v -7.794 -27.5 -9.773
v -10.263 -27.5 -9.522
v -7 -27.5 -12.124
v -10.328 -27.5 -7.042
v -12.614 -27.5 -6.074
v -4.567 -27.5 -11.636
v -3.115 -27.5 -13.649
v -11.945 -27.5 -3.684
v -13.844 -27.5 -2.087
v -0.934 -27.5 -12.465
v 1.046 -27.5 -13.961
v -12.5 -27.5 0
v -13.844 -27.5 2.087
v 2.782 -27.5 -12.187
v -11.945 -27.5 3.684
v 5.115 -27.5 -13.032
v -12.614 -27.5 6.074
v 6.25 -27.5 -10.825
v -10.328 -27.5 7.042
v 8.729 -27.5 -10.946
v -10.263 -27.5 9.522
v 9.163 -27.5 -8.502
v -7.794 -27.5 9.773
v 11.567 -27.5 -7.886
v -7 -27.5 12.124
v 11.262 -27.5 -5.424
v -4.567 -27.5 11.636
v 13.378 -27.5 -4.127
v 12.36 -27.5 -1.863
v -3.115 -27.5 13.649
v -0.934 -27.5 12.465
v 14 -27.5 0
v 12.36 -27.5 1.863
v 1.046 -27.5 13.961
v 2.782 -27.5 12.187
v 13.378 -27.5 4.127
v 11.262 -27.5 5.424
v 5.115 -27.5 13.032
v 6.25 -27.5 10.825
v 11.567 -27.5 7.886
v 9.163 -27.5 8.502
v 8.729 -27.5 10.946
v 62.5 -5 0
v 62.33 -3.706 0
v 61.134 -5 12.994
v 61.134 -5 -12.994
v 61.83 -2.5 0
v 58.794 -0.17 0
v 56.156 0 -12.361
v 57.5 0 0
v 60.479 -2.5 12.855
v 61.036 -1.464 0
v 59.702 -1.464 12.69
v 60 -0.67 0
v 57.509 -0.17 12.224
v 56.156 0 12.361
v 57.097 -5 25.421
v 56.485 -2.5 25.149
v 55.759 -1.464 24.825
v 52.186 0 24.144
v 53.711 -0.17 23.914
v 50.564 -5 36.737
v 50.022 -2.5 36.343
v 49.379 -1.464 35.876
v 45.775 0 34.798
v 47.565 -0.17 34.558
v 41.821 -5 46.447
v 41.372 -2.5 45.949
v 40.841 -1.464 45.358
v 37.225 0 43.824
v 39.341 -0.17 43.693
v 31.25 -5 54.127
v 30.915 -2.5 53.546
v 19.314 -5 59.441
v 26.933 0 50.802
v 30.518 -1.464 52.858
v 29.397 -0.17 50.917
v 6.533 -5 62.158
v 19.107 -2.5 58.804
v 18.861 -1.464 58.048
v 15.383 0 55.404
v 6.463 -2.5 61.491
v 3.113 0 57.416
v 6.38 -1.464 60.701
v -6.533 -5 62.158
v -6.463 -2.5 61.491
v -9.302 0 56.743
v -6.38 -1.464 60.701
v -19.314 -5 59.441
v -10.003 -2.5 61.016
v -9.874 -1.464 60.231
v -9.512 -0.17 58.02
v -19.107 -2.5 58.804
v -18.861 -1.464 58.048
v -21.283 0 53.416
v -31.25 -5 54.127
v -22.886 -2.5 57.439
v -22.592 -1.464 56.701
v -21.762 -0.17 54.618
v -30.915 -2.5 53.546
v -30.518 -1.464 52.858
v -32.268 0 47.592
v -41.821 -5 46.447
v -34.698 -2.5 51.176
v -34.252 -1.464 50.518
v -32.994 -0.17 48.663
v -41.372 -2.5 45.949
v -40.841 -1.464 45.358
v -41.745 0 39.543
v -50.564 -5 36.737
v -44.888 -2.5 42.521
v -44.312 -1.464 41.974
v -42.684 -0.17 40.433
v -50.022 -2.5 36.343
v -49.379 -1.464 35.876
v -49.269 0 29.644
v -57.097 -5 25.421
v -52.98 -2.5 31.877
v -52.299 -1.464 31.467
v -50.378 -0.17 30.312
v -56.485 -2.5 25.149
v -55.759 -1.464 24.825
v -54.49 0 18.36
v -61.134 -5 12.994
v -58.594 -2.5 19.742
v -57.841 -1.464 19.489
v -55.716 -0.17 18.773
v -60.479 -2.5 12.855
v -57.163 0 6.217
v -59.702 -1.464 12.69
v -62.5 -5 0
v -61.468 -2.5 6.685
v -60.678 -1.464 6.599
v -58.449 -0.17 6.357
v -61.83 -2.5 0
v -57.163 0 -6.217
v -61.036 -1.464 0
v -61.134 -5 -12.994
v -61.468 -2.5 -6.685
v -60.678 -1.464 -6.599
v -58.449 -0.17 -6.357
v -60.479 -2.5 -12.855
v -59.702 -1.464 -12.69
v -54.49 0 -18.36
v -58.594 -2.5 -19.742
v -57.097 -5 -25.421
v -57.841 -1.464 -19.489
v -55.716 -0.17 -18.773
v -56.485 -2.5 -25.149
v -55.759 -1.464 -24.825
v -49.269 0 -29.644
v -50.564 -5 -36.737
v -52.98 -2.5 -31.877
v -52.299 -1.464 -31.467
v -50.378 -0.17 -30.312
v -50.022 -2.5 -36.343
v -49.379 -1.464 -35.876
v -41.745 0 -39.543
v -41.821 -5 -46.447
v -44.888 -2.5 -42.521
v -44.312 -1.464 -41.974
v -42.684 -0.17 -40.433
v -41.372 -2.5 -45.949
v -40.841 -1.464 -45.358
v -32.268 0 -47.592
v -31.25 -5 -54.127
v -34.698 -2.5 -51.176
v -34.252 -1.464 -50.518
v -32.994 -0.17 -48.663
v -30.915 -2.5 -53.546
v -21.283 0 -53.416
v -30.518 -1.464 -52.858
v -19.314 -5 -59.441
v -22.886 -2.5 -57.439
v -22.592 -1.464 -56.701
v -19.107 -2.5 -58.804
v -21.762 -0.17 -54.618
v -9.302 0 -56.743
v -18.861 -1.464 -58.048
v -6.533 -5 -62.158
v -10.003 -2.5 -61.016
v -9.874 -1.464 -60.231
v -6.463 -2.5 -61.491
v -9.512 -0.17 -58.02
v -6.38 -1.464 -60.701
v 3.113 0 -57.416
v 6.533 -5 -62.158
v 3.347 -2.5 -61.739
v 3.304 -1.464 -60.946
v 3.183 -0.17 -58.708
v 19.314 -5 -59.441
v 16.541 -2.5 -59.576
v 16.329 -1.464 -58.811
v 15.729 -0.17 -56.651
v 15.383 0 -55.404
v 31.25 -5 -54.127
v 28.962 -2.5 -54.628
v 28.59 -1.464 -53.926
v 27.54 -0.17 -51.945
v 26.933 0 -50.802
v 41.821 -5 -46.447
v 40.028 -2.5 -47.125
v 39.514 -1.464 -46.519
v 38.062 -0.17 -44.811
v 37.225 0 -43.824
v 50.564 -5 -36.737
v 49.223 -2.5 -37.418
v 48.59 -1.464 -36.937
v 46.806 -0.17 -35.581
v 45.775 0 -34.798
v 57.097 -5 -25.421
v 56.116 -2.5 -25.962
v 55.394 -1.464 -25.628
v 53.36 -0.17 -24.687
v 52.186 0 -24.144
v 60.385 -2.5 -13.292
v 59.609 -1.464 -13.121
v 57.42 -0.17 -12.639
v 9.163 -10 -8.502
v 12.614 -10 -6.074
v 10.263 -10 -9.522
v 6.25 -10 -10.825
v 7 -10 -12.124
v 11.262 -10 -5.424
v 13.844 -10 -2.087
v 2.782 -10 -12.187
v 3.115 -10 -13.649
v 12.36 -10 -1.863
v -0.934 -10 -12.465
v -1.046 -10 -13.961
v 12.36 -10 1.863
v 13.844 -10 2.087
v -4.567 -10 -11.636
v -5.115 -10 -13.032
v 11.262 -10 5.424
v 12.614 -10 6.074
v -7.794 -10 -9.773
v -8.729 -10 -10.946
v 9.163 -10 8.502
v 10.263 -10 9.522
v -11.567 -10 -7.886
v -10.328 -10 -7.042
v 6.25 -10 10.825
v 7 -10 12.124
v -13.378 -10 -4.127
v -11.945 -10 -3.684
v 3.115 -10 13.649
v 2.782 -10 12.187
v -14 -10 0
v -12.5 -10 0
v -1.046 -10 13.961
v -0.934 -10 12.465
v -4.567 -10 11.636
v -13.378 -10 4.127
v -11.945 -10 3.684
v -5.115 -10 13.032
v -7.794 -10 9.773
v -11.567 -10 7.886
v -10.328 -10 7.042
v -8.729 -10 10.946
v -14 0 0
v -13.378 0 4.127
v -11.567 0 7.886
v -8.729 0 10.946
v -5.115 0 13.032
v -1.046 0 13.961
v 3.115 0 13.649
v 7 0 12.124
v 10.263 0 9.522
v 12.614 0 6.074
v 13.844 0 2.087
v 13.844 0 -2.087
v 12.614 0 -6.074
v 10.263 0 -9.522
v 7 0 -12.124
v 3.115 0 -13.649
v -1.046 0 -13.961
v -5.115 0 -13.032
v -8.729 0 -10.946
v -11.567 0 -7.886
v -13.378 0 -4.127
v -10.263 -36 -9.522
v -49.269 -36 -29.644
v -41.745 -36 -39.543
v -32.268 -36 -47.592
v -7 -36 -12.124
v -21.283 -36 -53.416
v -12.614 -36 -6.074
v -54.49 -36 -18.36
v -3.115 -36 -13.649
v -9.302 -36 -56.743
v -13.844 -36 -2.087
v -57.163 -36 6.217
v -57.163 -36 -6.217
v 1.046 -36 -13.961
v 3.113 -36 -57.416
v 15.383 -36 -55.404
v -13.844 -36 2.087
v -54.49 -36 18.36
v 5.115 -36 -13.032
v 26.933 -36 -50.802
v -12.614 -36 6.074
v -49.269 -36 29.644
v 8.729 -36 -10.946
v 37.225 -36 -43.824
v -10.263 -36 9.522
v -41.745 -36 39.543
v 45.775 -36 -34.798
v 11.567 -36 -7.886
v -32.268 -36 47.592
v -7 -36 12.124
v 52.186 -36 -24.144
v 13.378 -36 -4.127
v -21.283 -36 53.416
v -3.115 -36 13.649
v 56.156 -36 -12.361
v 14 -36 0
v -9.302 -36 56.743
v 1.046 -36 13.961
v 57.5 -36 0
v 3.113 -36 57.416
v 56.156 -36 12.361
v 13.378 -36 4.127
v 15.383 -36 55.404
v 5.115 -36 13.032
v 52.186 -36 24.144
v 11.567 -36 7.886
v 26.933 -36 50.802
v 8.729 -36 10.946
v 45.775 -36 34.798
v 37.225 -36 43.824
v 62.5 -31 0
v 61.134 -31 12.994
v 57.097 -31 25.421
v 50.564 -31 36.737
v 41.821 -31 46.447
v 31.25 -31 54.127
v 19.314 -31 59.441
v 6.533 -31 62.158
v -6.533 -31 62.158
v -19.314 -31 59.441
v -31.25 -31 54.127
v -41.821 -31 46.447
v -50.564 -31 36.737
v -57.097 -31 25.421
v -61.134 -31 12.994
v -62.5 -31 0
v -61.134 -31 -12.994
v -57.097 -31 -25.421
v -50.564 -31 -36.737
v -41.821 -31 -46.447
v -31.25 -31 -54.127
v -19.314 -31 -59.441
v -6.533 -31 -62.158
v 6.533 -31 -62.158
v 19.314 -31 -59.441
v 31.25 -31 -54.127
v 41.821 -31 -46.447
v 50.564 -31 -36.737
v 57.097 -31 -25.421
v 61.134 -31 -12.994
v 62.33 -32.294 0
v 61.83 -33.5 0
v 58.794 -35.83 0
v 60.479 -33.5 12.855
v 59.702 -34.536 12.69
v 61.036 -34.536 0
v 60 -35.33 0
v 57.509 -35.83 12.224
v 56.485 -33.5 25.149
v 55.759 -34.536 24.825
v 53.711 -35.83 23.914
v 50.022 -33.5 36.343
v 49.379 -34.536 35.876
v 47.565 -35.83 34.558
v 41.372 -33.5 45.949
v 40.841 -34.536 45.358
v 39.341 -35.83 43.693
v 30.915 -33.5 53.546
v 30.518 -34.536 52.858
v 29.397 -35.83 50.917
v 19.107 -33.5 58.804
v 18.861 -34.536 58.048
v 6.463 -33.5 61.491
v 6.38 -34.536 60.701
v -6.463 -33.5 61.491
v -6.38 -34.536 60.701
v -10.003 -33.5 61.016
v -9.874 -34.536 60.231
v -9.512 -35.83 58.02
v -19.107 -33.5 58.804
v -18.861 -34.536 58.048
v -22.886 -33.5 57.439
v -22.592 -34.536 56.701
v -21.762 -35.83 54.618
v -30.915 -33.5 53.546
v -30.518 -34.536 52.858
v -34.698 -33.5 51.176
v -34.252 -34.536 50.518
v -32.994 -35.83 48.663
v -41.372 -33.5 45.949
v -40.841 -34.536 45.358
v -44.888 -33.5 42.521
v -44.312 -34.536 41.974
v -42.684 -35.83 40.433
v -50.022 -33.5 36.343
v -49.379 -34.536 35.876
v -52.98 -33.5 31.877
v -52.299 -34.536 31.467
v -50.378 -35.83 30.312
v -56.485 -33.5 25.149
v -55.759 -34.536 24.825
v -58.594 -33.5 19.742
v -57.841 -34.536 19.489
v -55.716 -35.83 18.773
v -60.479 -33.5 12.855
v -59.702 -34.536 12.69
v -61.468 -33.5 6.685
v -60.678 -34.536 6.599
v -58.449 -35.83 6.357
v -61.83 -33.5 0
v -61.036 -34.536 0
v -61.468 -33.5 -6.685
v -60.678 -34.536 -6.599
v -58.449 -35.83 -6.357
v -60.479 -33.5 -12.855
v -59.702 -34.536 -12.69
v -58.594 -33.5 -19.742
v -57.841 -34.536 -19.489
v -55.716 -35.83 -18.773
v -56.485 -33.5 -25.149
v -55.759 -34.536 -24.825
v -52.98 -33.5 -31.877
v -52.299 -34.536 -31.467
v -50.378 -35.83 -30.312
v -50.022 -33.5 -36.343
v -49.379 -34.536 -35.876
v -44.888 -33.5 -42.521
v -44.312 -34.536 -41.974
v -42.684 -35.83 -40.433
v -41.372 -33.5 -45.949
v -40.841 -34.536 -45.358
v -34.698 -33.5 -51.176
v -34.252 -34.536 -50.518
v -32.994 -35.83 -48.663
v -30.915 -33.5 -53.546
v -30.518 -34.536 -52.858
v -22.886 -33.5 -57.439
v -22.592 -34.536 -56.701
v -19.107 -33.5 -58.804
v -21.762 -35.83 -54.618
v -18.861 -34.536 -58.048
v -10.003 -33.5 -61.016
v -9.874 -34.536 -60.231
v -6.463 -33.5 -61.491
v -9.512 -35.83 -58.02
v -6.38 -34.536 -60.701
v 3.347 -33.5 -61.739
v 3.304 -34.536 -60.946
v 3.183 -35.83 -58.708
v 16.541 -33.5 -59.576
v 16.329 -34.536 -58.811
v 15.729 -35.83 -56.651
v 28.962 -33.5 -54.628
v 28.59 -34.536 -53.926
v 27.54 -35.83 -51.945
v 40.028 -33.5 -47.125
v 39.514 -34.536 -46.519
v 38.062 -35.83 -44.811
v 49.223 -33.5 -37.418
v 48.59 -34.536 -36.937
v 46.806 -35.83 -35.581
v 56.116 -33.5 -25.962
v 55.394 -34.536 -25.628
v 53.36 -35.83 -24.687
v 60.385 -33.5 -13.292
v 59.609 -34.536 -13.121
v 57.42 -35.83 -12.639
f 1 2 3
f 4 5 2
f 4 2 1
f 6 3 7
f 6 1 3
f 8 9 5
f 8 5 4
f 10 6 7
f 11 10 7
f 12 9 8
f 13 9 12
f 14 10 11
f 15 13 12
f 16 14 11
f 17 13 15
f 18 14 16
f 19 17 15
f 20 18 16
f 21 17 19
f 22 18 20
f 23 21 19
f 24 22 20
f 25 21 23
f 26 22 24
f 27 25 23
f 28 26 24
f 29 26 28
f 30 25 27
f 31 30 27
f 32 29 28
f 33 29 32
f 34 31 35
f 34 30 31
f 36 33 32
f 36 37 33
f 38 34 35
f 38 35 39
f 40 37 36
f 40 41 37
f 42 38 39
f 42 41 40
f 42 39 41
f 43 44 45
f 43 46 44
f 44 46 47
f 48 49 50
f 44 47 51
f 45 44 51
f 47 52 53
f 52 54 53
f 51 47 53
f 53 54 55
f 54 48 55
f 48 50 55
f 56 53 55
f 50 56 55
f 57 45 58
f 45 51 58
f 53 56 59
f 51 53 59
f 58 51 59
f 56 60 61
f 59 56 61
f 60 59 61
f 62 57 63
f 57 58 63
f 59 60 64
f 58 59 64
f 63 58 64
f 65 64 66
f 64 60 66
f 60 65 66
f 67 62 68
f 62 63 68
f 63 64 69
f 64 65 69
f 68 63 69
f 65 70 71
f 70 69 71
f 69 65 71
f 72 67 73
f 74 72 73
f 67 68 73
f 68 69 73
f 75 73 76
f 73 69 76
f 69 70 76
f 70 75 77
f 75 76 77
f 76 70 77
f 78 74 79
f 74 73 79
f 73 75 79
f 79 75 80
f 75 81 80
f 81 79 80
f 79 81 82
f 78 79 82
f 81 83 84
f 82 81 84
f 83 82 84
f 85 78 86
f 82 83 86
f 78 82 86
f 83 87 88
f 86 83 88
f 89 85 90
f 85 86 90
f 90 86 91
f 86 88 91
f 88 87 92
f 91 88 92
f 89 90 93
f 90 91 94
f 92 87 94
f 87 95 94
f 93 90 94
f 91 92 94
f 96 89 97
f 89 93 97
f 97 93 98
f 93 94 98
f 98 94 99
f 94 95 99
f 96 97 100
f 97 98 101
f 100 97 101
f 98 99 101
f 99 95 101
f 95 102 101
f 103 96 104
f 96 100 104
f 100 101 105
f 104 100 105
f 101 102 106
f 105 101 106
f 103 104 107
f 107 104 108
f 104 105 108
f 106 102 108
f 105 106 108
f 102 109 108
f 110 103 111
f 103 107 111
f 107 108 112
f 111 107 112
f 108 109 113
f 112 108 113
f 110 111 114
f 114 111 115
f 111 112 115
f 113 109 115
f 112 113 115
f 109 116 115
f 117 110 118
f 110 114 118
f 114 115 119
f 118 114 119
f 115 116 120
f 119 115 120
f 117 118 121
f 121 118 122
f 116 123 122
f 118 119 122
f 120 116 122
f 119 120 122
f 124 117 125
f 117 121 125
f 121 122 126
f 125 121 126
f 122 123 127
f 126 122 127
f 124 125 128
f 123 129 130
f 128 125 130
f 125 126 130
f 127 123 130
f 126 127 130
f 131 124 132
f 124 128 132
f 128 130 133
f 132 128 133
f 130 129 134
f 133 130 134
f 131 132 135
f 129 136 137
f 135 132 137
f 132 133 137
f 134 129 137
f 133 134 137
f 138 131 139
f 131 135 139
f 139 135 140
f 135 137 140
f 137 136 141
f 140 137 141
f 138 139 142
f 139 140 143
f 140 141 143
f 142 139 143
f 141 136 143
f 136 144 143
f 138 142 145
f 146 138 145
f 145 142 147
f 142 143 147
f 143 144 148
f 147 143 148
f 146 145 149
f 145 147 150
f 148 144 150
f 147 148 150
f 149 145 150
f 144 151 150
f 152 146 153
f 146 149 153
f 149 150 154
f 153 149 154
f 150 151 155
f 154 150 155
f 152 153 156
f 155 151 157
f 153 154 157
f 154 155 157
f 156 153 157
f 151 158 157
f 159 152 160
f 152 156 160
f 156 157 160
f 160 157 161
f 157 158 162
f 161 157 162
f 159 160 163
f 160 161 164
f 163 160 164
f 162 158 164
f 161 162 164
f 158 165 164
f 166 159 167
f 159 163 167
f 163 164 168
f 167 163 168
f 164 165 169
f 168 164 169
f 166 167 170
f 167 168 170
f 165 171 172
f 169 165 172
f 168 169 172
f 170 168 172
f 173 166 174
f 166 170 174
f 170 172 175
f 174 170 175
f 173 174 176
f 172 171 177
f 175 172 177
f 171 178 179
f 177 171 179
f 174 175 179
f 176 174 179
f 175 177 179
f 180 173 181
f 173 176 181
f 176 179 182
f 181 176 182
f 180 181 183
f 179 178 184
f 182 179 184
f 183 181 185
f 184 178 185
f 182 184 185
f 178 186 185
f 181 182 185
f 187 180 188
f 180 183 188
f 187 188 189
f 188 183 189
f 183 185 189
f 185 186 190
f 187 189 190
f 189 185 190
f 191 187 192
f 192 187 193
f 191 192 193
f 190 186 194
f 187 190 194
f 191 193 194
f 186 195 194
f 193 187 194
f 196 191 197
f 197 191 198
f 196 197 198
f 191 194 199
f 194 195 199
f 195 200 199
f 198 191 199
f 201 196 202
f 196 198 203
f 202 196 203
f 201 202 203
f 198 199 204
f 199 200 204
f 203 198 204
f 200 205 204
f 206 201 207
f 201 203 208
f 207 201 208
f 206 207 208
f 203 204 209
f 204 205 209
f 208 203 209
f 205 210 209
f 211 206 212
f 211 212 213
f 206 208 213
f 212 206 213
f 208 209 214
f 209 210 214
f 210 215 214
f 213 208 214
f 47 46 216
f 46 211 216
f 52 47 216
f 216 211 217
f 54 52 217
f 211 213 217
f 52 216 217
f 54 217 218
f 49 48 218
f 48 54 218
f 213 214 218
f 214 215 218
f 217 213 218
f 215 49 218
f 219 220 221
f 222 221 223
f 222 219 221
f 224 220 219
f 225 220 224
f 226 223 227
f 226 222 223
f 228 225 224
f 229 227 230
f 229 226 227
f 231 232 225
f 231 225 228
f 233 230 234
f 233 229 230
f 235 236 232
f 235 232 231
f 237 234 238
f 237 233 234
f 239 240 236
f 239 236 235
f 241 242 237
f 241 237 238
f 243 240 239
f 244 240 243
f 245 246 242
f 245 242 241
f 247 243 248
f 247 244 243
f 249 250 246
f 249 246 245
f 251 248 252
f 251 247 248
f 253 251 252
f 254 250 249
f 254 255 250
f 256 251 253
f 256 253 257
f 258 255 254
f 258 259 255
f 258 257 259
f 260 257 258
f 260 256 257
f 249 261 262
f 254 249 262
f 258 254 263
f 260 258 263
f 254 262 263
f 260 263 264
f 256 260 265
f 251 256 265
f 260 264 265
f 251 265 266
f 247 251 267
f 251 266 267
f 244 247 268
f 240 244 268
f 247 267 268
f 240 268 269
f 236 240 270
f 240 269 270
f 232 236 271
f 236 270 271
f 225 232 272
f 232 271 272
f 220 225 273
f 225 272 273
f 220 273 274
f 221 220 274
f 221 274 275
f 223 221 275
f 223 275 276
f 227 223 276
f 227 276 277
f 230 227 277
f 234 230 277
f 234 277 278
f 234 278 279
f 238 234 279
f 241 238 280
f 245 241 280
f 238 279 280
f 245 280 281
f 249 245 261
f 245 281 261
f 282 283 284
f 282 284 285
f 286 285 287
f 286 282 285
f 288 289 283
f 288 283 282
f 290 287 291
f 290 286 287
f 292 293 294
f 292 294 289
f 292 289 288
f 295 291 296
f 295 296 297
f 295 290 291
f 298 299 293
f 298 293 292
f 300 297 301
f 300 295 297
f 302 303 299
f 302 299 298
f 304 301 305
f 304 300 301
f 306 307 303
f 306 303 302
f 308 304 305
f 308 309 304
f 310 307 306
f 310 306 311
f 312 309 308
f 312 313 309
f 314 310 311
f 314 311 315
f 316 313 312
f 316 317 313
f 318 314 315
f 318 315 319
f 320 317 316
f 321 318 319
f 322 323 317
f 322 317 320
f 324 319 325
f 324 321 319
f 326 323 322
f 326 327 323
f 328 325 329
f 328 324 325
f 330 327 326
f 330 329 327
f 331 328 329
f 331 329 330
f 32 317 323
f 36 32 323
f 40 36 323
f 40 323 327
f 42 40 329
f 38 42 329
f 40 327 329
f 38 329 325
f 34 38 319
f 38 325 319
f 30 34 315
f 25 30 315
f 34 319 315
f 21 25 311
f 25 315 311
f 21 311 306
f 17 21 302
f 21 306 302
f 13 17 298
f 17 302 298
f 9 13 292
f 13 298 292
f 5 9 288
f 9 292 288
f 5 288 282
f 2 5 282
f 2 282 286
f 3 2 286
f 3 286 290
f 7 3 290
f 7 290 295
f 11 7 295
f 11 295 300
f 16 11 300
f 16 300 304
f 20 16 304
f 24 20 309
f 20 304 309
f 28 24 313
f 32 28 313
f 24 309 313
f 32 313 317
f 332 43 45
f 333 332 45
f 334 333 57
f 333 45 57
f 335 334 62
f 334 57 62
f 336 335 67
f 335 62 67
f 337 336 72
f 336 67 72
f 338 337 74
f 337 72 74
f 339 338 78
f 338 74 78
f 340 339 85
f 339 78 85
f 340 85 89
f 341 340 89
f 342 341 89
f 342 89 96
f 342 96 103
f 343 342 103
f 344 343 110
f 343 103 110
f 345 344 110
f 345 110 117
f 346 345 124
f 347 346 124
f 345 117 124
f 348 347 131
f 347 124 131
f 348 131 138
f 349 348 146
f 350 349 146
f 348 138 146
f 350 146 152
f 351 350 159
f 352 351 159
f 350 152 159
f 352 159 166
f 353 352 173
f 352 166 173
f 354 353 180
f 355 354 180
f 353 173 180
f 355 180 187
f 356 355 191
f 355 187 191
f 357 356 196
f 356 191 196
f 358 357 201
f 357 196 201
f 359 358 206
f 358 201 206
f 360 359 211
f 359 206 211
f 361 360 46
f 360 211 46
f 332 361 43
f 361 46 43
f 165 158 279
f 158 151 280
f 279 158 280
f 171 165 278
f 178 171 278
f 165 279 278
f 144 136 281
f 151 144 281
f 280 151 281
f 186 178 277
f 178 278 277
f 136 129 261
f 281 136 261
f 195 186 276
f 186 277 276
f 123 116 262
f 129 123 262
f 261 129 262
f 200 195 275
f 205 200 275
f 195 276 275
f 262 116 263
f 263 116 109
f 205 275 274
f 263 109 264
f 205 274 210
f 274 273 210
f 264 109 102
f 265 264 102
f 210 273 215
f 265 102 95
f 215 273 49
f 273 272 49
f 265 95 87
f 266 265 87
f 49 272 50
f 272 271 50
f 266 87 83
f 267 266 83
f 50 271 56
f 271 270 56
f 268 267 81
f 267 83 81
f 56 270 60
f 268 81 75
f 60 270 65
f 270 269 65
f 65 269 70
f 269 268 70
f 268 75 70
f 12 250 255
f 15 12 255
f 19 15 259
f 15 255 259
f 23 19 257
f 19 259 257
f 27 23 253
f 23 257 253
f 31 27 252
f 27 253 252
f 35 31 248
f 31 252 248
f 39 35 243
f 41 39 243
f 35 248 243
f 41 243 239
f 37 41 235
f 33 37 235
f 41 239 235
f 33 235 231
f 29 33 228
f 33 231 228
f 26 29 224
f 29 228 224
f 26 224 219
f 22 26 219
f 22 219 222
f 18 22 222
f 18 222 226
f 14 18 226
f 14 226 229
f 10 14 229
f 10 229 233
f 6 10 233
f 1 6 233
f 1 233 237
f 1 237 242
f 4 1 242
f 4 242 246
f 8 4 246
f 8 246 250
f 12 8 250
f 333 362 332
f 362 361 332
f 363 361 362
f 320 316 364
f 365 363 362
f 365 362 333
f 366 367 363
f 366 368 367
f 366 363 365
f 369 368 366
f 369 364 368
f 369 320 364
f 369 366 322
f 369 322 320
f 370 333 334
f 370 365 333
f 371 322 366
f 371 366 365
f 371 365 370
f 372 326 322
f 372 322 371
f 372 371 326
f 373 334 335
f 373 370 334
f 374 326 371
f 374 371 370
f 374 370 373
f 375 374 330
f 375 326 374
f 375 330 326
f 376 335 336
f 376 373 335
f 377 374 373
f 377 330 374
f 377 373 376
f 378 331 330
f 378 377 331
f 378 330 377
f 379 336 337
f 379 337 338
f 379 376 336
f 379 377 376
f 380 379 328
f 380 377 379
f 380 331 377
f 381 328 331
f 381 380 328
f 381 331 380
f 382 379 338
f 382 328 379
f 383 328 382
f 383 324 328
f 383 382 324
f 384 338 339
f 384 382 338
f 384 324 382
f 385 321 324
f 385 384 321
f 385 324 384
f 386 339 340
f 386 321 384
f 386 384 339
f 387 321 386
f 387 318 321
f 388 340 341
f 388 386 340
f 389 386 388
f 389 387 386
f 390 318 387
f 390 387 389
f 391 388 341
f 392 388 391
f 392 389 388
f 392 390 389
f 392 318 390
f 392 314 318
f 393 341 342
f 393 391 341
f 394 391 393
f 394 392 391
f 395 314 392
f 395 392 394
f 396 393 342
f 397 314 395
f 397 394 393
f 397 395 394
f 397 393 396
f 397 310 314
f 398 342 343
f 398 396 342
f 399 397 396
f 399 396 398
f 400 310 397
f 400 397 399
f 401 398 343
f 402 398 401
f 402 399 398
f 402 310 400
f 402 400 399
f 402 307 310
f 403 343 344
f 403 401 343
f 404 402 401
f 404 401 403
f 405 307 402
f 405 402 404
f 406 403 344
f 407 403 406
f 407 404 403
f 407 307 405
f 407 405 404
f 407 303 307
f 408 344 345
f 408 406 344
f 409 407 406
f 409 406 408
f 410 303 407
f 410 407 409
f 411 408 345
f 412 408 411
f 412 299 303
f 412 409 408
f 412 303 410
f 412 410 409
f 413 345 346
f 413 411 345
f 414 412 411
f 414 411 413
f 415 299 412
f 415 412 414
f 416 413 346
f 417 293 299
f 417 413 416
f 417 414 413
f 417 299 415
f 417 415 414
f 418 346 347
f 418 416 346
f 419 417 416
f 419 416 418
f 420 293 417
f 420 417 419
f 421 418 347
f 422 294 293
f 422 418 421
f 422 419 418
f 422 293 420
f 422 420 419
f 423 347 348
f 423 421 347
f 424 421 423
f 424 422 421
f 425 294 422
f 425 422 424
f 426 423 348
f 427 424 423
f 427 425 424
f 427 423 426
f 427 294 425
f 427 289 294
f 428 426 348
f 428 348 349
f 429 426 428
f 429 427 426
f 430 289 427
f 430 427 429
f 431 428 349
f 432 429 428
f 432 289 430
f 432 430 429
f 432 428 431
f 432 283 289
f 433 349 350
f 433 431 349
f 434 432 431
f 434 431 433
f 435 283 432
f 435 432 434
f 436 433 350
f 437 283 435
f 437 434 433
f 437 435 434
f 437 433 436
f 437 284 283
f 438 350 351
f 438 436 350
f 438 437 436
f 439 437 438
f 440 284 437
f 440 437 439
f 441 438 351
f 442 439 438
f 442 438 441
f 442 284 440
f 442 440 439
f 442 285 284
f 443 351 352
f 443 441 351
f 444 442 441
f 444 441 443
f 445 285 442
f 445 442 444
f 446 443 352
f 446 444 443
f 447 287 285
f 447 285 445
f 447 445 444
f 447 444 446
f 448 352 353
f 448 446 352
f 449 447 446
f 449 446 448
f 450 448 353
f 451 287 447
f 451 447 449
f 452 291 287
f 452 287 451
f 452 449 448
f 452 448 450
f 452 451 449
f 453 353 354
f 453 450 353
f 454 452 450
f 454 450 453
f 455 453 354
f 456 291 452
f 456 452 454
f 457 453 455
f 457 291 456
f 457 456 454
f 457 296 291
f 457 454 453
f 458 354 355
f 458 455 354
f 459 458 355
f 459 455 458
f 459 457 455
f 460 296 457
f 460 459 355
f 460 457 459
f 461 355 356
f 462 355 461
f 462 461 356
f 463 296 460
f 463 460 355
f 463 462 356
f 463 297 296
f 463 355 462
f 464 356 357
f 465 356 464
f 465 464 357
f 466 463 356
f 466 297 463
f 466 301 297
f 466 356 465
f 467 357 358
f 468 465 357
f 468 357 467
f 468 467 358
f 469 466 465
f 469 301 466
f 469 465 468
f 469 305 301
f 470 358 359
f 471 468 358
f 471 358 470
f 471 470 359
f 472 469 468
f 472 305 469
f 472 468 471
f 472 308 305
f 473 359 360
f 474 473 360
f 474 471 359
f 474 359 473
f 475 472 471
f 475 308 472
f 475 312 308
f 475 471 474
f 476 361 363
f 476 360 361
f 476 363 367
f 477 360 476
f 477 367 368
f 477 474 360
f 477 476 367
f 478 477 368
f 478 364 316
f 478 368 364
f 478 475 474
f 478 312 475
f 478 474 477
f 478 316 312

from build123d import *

# Parameters (mm, degrees)
F0_R     = 62.5
F1_DEPTH = 36
F2_R     = 5
F3_R     = 12.5
F4_DEPTH = 36.001
F5_R     = 14
F6_DEPTH = 8.5
F7_R     = 14
F8_DEPTH = 10


with BuildPart() as f1:
    # F0 (on Front) → F1 (new body)
    with BuildSketch(Plane.XZ):
        Circle(F0_R)
    extrude(amount=F1_DEPTH)

    # F2
    f2_edges = [f1.edges().sort_by_distance(p)[0] for p in [
        (-62.5, -36, 0),
        (-62.5, 0, 0),
    ]]
    fillet(f2_edges, radius=F2_R)

    # F3 (on face) → F4 (cut, through all)
    with BuildSketch(Plane(origin=(0, 0, 0), x_dir=(-1, 0, 0), z_dir=(0, 1, 0))):
        Circle(F3_R)
    extrude(amount=-F4_DEPTH, mode=Mode.SUBTRACT)

    # F5 (on face) → F6 (cut)
    with BuildSketch(Plane.XZ.offset(36)):
        Circle(F5_R)
    extrude(amount=-F6_DEPTH, mode=Mode.SUBTRACT)

    # F7 (on face) → F8 (cut)
    with BuildSketch(Plane(origin=(0, 0, 0), x_dir=(-1, 0, 0), z_dir=(0, 1, 0))):
        Circle(F7_R)
    extrude(amount=-F8_DEPTH, mode=Mode.SUBTRACT)


solid = f1.part
